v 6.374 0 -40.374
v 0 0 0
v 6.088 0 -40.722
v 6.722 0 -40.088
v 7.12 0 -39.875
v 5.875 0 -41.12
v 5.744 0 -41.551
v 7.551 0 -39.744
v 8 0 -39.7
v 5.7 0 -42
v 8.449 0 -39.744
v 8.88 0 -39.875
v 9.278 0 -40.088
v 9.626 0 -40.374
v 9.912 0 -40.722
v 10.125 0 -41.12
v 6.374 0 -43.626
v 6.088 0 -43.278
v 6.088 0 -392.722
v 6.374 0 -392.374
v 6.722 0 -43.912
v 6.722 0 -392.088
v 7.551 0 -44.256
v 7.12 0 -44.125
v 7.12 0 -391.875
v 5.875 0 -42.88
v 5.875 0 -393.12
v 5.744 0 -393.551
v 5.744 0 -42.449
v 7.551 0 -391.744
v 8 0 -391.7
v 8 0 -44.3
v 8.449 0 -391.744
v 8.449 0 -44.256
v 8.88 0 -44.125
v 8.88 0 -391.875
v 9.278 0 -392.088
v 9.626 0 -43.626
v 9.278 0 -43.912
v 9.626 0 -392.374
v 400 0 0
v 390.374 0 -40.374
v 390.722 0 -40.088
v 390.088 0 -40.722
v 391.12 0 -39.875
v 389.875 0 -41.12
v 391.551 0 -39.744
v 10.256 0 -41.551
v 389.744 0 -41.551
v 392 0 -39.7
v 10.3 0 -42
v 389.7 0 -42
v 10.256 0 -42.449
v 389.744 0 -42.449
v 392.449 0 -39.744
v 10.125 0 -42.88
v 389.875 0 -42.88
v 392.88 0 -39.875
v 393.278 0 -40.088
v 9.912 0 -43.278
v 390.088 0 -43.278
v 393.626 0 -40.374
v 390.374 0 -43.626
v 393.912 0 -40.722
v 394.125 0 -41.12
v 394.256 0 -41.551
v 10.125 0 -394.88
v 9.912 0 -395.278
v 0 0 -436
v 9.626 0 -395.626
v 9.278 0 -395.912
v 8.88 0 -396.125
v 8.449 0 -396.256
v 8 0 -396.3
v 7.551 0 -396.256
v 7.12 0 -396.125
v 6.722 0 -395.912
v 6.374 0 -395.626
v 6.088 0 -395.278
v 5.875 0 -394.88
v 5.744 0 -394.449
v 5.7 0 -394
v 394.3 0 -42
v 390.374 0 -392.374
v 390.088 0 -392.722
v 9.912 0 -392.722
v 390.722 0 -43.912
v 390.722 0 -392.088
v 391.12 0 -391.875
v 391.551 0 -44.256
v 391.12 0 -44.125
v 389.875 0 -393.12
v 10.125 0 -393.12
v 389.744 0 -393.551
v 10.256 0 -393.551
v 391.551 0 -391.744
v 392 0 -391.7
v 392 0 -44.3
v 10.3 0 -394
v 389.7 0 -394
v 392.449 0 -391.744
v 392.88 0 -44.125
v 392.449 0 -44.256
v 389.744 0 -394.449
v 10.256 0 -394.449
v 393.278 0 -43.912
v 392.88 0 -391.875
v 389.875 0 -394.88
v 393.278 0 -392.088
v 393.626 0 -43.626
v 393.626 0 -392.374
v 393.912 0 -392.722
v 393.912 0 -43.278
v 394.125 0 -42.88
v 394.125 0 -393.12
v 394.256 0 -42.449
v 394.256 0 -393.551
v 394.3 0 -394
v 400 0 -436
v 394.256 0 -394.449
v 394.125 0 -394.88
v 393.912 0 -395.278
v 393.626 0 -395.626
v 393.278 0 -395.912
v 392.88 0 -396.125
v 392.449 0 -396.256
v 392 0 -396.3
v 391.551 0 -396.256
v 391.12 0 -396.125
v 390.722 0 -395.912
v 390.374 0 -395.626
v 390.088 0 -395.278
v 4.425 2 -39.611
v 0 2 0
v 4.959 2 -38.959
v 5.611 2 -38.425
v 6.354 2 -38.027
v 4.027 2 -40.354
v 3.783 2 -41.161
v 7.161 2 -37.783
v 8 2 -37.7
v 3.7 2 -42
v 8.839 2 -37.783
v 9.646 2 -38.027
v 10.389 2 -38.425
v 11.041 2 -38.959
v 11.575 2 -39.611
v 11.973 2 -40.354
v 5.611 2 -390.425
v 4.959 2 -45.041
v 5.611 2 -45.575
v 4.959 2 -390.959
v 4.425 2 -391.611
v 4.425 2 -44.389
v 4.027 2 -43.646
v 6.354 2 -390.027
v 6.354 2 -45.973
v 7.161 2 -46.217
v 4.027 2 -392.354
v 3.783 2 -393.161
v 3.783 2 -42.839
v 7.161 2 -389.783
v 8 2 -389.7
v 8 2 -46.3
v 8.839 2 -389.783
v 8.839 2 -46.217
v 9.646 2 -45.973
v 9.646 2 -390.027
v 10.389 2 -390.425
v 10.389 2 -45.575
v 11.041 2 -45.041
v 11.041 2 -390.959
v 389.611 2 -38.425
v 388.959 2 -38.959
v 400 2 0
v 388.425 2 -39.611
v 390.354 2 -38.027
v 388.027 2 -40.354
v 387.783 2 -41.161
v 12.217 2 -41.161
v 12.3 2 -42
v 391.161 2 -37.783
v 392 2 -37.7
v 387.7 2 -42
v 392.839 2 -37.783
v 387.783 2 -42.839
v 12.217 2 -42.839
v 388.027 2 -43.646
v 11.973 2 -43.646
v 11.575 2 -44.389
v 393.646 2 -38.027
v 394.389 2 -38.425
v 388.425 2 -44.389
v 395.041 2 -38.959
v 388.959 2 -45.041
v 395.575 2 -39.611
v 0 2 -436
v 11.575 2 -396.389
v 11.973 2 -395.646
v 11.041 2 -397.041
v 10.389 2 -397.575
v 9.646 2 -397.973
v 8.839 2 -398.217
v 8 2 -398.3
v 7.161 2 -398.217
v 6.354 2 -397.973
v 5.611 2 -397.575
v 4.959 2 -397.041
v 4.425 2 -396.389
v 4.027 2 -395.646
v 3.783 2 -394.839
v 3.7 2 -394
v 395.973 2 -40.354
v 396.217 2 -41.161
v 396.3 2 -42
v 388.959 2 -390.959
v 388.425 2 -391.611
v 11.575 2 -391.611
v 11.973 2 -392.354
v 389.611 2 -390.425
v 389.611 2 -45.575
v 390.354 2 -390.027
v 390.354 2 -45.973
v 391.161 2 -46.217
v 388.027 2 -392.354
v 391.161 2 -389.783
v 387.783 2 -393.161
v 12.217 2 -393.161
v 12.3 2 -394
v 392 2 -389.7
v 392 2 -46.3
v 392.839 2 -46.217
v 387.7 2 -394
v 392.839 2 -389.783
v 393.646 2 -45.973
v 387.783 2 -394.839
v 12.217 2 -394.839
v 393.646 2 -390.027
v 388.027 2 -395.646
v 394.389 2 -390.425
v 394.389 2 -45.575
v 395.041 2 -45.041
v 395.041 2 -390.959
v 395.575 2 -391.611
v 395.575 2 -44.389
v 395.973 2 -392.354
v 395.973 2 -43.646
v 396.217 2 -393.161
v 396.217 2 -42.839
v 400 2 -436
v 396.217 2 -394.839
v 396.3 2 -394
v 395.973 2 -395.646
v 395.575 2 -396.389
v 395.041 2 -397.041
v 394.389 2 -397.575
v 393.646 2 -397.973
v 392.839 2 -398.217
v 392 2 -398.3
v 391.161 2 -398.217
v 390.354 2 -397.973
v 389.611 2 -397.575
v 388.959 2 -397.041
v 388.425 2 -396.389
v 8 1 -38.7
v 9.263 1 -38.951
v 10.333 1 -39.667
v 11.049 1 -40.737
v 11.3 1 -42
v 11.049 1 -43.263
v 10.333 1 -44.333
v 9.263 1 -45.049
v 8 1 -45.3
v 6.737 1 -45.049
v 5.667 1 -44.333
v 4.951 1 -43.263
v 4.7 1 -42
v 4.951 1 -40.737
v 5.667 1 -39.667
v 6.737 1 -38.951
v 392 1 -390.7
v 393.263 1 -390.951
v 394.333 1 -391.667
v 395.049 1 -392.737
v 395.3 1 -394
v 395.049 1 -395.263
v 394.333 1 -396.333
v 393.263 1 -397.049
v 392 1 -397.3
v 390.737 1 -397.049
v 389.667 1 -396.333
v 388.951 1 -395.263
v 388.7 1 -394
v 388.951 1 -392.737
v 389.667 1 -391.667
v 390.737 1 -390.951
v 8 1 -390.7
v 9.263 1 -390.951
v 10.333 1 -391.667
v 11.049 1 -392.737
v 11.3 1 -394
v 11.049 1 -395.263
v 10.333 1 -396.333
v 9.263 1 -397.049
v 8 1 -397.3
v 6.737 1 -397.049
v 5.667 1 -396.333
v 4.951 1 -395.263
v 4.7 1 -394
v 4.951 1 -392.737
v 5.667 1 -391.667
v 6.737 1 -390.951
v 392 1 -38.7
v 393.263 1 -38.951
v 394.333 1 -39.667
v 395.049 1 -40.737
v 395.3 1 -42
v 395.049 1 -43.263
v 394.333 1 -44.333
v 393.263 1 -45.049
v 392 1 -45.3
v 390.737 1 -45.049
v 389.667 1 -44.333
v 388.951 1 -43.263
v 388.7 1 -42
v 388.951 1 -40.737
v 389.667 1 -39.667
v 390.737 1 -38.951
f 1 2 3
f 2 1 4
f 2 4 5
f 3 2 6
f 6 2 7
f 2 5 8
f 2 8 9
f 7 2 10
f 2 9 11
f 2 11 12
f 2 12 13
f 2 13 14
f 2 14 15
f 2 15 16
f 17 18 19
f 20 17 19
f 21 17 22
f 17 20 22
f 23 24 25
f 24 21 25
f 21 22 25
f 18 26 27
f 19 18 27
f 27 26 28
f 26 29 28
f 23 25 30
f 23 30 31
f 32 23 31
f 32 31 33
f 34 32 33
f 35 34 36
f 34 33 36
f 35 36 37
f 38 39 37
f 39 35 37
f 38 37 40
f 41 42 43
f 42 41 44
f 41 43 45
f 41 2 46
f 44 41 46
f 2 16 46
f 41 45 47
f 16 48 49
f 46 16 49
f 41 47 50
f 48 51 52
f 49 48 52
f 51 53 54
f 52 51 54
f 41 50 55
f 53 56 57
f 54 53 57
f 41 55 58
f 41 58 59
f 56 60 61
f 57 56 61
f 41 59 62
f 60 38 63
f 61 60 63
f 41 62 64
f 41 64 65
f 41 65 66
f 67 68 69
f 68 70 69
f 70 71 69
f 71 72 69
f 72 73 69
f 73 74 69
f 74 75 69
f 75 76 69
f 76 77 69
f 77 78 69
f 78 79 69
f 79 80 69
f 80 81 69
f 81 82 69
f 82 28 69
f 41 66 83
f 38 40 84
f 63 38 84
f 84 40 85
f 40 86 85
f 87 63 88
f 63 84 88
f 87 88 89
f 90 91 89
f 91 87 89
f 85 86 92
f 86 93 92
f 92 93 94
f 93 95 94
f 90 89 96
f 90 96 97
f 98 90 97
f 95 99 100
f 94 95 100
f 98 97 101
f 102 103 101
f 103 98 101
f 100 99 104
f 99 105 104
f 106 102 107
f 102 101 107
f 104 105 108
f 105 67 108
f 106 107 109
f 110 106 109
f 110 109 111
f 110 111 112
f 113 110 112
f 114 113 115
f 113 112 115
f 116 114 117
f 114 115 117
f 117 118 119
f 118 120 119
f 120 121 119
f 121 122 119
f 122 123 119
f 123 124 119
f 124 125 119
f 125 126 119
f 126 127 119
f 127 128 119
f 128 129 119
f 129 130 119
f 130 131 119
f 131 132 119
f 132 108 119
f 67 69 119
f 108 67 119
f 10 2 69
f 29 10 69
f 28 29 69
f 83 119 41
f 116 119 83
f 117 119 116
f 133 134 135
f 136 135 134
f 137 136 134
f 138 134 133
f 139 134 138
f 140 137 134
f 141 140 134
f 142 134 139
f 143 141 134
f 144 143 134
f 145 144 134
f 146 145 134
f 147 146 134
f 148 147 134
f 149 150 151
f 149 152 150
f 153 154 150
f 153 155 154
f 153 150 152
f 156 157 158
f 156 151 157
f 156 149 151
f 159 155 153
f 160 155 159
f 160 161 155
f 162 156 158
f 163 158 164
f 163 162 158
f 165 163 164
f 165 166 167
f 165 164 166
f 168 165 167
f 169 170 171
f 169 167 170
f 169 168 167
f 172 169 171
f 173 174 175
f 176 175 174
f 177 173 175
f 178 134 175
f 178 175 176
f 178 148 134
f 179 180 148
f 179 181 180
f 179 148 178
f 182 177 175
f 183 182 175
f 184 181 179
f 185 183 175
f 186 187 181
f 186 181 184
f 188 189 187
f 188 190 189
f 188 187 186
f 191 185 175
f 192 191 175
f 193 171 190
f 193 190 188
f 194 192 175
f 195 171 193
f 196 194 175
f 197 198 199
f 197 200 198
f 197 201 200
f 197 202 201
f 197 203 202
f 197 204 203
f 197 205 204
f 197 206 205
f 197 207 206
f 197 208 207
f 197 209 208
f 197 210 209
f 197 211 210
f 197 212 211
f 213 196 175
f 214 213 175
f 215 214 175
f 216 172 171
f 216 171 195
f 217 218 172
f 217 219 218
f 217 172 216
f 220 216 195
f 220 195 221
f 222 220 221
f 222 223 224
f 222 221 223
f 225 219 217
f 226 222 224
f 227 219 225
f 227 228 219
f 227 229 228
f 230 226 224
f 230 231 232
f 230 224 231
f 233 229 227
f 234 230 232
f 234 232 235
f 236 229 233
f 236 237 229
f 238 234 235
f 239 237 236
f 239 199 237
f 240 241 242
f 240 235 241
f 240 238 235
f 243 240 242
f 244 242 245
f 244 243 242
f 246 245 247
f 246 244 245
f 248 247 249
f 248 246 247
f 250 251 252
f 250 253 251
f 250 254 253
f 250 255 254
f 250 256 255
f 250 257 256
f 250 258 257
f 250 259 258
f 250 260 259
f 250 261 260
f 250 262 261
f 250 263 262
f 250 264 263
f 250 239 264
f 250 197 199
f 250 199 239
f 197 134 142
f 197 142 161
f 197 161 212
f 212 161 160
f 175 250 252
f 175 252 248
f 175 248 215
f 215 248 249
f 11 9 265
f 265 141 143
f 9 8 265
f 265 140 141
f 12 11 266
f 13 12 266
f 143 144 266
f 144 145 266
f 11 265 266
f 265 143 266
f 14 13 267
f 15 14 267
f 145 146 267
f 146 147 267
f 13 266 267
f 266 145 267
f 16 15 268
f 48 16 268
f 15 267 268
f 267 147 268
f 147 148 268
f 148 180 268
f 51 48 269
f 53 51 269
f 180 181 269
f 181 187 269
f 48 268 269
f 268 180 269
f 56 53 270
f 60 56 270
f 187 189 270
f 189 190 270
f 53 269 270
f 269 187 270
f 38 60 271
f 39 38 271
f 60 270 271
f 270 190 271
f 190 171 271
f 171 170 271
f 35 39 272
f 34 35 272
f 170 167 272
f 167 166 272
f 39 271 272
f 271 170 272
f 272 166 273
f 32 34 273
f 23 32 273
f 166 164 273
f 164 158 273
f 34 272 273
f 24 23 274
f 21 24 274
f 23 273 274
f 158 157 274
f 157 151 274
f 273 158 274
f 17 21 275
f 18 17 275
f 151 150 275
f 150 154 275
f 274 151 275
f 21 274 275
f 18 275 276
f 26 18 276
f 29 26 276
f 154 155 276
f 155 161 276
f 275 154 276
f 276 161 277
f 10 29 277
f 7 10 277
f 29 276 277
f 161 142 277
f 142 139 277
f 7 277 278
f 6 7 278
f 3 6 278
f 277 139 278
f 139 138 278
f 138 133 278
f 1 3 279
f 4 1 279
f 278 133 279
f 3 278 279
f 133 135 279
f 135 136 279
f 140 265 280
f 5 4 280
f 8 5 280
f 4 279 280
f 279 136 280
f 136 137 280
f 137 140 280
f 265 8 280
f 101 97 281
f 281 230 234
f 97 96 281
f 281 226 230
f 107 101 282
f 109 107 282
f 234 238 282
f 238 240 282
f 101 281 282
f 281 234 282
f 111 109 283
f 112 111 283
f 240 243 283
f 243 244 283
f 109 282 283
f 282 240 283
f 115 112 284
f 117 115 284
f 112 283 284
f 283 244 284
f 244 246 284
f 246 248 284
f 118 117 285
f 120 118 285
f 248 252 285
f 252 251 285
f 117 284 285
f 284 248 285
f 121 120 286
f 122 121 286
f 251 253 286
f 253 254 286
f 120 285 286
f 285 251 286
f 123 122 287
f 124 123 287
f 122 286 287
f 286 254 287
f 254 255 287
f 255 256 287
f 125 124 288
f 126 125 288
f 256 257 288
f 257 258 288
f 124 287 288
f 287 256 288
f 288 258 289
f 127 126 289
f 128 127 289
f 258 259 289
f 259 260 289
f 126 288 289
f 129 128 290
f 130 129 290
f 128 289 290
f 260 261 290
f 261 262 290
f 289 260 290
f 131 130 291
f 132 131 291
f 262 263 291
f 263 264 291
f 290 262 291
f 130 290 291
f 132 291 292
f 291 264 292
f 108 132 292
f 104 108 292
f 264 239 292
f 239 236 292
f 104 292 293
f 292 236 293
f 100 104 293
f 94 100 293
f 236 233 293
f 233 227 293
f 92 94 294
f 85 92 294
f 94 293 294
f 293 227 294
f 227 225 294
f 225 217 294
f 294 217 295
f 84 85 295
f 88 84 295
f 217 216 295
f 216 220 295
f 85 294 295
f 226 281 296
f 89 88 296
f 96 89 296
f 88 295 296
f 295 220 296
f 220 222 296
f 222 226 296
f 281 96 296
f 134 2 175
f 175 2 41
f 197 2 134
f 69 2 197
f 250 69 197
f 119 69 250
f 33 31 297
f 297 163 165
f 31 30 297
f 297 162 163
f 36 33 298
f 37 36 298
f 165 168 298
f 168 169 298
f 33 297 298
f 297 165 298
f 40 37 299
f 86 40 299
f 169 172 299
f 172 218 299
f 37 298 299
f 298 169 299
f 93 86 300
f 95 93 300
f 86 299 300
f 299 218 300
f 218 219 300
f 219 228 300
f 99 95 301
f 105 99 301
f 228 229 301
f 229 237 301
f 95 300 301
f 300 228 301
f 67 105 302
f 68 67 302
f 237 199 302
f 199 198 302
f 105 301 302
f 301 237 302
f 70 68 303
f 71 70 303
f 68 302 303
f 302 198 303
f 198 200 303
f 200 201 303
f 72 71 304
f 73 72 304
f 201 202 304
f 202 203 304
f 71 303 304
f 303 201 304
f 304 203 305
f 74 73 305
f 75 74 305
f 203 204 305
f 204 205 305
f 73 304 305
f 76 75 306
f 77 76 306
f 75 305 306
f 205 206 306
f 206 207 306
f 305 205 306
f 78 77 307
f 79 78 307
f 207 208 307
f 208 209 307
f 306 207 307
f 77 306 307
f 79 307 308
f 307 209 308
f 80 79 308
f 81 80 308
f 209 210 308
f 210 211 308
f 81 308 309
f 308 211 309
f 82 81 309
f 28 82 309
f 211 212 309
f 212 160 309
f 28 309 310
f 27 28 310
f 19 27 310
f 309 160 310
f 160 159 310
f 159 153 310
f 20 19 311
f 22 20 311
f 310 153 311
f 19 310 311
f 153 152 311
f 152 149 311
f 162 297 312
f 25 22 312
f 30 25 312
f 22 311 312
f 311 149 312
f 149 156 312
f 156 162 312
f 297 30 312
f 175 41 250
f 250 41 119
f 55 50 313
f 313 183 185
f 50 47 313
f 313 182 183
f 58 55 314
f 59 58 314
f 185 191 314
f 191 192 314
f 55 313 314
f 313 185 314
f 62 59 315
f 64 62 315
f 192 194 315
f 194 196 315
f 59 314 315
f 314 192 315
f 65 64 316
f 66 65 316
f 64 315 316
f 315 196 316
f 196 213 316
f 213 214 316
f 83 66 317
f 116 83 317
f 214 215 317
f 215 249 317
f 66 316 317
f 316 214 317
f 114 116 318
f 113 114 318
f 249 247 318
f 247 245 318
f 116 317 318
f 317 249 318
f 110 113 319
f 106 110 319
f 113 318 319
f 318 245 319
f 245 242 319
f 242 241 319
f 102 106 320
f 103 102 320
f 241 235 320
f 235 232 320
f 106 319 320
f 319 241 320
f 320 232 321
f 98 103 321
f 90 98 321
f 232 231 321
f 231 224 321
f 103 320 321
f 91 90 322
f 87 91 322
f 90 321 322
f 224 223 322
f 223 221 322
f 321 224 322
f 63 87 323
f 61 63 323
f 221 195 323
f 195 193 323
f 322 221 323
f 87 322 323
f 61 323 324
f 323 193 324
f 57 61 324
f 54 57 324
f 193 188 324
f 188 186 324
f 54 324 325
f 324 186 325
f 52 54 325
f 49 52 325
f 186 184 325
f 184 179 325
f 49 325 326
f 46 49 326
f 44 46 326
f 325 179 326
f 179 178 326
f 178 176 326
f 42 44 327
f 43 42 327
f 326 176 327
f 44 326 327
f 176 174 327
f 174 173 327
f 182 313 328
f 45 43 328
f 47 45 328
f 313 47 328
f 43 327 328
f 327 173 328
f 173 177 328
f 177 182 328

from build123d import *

# Parameters (mm, degrees)
SKETCH_1_W      = 400
SKETCH_1_H      = 436
SKETCH_1_R      = 2.25
EXTRUDE_1_DEPTH = 2
CHAMFER_1_SIZE  = 2.05


with BuildPart() as part:
    # Эскиз1 → Бобышка-Вытянуть1 (new body)
    with BuildSketch(Plane(origin=(0, 0, 0), x_dir=(1, 0, 0), z_dir=(0, 1, 0))):
        with Locations((200, 218)):
            Rectangle(SKETCH_1_W, SKETCH_1_H)
        with Locations(Location((8, 394, 0), (0, 0, 270))):
            Circle(SKETCH_1_R, mode=Mode.SUBTRACT)
        with Locations(Location((392, 394, 0), (0, 0, 270))):
            Circle(SKETCH_1_R, mode=Mode.SUBTRACT)
        with Locations(Location((392, 42, 0), (0, 0, 270))):
            Circle(SKETCH_1_R, mode=Mode.SUBTRACT)
        with Locations(Location((8, 42, 0), (0, 0, 270))):
            Circle(SKETCH_1_R, mode=Mode.SUBTRACT)
    extrude(amount=EXTRUDE_1_DEPTH)

    # Фаска1
    # the kernel refuses this chamfer: 2.05 mm, written as the material it takes off along each edge
    with BuildSketch(Plane(origin=(392, 2, -394), x_dir=(0, 0, 1), z_dir=(-1, 0, 0))) as chamfer_1_piece_1:
        Polygon((2.25, -CHAMFER_1_SIZE), (2.25 + CHAMFER_1_SIZE, 0), (2.25, 0), align=None)
    revolve(axis=Axis((392, 2, -394), (0, 1, 0)), mode=Mode.SUBTRACT)
    with BuildSketch(Plane(origin=(392, 2, -42), x_dir=(0, 0, 1), z_dir=(-1, 0, 0))) as chamfer_1_piece_2:
        Polygon((2.25, -CHAMFER_1_SIZE), (2.25 + CHAMFER_1_SIZE, 0), (2.25, 0), align=None)
    revolve(axis=Axis((392, 2, -42), (0, 1, 0)), mode=Mode.SUBTRACT)
    with BuildSketch(Plane(origin=(8, 2, -394), x_dir=(0, 0, 1), z_dir=(-1, 0, 0))) as chamfer_1_piece_3:
        Polygon((2.25, -CHAMFER_1_SIZE), (2.25 + CHAMFER_1_SIZE, 0), (2.25, 0), align=None)
    revolve(axis=Axis((8, 2, -394), (0, 1, 0)), mode=Mode.SUBTRACT)
    with BuildSketch(Plane(origin=(8, 2, -42), x_dir=(0, 0, 1), z_dir=(-1, 0, 0))) as chamfer_1_piece_4:
        Polygon((2.25, -CHAMFER_1_SIZE), (2.25 + CHAMFER_1_SIZE, 0), (2.25, 0), align=None)
    revolve(axis=Axis((8, 2, -42), (0, 1, 0)), mode=Mode.SUBTRACT)


solid = part.part
